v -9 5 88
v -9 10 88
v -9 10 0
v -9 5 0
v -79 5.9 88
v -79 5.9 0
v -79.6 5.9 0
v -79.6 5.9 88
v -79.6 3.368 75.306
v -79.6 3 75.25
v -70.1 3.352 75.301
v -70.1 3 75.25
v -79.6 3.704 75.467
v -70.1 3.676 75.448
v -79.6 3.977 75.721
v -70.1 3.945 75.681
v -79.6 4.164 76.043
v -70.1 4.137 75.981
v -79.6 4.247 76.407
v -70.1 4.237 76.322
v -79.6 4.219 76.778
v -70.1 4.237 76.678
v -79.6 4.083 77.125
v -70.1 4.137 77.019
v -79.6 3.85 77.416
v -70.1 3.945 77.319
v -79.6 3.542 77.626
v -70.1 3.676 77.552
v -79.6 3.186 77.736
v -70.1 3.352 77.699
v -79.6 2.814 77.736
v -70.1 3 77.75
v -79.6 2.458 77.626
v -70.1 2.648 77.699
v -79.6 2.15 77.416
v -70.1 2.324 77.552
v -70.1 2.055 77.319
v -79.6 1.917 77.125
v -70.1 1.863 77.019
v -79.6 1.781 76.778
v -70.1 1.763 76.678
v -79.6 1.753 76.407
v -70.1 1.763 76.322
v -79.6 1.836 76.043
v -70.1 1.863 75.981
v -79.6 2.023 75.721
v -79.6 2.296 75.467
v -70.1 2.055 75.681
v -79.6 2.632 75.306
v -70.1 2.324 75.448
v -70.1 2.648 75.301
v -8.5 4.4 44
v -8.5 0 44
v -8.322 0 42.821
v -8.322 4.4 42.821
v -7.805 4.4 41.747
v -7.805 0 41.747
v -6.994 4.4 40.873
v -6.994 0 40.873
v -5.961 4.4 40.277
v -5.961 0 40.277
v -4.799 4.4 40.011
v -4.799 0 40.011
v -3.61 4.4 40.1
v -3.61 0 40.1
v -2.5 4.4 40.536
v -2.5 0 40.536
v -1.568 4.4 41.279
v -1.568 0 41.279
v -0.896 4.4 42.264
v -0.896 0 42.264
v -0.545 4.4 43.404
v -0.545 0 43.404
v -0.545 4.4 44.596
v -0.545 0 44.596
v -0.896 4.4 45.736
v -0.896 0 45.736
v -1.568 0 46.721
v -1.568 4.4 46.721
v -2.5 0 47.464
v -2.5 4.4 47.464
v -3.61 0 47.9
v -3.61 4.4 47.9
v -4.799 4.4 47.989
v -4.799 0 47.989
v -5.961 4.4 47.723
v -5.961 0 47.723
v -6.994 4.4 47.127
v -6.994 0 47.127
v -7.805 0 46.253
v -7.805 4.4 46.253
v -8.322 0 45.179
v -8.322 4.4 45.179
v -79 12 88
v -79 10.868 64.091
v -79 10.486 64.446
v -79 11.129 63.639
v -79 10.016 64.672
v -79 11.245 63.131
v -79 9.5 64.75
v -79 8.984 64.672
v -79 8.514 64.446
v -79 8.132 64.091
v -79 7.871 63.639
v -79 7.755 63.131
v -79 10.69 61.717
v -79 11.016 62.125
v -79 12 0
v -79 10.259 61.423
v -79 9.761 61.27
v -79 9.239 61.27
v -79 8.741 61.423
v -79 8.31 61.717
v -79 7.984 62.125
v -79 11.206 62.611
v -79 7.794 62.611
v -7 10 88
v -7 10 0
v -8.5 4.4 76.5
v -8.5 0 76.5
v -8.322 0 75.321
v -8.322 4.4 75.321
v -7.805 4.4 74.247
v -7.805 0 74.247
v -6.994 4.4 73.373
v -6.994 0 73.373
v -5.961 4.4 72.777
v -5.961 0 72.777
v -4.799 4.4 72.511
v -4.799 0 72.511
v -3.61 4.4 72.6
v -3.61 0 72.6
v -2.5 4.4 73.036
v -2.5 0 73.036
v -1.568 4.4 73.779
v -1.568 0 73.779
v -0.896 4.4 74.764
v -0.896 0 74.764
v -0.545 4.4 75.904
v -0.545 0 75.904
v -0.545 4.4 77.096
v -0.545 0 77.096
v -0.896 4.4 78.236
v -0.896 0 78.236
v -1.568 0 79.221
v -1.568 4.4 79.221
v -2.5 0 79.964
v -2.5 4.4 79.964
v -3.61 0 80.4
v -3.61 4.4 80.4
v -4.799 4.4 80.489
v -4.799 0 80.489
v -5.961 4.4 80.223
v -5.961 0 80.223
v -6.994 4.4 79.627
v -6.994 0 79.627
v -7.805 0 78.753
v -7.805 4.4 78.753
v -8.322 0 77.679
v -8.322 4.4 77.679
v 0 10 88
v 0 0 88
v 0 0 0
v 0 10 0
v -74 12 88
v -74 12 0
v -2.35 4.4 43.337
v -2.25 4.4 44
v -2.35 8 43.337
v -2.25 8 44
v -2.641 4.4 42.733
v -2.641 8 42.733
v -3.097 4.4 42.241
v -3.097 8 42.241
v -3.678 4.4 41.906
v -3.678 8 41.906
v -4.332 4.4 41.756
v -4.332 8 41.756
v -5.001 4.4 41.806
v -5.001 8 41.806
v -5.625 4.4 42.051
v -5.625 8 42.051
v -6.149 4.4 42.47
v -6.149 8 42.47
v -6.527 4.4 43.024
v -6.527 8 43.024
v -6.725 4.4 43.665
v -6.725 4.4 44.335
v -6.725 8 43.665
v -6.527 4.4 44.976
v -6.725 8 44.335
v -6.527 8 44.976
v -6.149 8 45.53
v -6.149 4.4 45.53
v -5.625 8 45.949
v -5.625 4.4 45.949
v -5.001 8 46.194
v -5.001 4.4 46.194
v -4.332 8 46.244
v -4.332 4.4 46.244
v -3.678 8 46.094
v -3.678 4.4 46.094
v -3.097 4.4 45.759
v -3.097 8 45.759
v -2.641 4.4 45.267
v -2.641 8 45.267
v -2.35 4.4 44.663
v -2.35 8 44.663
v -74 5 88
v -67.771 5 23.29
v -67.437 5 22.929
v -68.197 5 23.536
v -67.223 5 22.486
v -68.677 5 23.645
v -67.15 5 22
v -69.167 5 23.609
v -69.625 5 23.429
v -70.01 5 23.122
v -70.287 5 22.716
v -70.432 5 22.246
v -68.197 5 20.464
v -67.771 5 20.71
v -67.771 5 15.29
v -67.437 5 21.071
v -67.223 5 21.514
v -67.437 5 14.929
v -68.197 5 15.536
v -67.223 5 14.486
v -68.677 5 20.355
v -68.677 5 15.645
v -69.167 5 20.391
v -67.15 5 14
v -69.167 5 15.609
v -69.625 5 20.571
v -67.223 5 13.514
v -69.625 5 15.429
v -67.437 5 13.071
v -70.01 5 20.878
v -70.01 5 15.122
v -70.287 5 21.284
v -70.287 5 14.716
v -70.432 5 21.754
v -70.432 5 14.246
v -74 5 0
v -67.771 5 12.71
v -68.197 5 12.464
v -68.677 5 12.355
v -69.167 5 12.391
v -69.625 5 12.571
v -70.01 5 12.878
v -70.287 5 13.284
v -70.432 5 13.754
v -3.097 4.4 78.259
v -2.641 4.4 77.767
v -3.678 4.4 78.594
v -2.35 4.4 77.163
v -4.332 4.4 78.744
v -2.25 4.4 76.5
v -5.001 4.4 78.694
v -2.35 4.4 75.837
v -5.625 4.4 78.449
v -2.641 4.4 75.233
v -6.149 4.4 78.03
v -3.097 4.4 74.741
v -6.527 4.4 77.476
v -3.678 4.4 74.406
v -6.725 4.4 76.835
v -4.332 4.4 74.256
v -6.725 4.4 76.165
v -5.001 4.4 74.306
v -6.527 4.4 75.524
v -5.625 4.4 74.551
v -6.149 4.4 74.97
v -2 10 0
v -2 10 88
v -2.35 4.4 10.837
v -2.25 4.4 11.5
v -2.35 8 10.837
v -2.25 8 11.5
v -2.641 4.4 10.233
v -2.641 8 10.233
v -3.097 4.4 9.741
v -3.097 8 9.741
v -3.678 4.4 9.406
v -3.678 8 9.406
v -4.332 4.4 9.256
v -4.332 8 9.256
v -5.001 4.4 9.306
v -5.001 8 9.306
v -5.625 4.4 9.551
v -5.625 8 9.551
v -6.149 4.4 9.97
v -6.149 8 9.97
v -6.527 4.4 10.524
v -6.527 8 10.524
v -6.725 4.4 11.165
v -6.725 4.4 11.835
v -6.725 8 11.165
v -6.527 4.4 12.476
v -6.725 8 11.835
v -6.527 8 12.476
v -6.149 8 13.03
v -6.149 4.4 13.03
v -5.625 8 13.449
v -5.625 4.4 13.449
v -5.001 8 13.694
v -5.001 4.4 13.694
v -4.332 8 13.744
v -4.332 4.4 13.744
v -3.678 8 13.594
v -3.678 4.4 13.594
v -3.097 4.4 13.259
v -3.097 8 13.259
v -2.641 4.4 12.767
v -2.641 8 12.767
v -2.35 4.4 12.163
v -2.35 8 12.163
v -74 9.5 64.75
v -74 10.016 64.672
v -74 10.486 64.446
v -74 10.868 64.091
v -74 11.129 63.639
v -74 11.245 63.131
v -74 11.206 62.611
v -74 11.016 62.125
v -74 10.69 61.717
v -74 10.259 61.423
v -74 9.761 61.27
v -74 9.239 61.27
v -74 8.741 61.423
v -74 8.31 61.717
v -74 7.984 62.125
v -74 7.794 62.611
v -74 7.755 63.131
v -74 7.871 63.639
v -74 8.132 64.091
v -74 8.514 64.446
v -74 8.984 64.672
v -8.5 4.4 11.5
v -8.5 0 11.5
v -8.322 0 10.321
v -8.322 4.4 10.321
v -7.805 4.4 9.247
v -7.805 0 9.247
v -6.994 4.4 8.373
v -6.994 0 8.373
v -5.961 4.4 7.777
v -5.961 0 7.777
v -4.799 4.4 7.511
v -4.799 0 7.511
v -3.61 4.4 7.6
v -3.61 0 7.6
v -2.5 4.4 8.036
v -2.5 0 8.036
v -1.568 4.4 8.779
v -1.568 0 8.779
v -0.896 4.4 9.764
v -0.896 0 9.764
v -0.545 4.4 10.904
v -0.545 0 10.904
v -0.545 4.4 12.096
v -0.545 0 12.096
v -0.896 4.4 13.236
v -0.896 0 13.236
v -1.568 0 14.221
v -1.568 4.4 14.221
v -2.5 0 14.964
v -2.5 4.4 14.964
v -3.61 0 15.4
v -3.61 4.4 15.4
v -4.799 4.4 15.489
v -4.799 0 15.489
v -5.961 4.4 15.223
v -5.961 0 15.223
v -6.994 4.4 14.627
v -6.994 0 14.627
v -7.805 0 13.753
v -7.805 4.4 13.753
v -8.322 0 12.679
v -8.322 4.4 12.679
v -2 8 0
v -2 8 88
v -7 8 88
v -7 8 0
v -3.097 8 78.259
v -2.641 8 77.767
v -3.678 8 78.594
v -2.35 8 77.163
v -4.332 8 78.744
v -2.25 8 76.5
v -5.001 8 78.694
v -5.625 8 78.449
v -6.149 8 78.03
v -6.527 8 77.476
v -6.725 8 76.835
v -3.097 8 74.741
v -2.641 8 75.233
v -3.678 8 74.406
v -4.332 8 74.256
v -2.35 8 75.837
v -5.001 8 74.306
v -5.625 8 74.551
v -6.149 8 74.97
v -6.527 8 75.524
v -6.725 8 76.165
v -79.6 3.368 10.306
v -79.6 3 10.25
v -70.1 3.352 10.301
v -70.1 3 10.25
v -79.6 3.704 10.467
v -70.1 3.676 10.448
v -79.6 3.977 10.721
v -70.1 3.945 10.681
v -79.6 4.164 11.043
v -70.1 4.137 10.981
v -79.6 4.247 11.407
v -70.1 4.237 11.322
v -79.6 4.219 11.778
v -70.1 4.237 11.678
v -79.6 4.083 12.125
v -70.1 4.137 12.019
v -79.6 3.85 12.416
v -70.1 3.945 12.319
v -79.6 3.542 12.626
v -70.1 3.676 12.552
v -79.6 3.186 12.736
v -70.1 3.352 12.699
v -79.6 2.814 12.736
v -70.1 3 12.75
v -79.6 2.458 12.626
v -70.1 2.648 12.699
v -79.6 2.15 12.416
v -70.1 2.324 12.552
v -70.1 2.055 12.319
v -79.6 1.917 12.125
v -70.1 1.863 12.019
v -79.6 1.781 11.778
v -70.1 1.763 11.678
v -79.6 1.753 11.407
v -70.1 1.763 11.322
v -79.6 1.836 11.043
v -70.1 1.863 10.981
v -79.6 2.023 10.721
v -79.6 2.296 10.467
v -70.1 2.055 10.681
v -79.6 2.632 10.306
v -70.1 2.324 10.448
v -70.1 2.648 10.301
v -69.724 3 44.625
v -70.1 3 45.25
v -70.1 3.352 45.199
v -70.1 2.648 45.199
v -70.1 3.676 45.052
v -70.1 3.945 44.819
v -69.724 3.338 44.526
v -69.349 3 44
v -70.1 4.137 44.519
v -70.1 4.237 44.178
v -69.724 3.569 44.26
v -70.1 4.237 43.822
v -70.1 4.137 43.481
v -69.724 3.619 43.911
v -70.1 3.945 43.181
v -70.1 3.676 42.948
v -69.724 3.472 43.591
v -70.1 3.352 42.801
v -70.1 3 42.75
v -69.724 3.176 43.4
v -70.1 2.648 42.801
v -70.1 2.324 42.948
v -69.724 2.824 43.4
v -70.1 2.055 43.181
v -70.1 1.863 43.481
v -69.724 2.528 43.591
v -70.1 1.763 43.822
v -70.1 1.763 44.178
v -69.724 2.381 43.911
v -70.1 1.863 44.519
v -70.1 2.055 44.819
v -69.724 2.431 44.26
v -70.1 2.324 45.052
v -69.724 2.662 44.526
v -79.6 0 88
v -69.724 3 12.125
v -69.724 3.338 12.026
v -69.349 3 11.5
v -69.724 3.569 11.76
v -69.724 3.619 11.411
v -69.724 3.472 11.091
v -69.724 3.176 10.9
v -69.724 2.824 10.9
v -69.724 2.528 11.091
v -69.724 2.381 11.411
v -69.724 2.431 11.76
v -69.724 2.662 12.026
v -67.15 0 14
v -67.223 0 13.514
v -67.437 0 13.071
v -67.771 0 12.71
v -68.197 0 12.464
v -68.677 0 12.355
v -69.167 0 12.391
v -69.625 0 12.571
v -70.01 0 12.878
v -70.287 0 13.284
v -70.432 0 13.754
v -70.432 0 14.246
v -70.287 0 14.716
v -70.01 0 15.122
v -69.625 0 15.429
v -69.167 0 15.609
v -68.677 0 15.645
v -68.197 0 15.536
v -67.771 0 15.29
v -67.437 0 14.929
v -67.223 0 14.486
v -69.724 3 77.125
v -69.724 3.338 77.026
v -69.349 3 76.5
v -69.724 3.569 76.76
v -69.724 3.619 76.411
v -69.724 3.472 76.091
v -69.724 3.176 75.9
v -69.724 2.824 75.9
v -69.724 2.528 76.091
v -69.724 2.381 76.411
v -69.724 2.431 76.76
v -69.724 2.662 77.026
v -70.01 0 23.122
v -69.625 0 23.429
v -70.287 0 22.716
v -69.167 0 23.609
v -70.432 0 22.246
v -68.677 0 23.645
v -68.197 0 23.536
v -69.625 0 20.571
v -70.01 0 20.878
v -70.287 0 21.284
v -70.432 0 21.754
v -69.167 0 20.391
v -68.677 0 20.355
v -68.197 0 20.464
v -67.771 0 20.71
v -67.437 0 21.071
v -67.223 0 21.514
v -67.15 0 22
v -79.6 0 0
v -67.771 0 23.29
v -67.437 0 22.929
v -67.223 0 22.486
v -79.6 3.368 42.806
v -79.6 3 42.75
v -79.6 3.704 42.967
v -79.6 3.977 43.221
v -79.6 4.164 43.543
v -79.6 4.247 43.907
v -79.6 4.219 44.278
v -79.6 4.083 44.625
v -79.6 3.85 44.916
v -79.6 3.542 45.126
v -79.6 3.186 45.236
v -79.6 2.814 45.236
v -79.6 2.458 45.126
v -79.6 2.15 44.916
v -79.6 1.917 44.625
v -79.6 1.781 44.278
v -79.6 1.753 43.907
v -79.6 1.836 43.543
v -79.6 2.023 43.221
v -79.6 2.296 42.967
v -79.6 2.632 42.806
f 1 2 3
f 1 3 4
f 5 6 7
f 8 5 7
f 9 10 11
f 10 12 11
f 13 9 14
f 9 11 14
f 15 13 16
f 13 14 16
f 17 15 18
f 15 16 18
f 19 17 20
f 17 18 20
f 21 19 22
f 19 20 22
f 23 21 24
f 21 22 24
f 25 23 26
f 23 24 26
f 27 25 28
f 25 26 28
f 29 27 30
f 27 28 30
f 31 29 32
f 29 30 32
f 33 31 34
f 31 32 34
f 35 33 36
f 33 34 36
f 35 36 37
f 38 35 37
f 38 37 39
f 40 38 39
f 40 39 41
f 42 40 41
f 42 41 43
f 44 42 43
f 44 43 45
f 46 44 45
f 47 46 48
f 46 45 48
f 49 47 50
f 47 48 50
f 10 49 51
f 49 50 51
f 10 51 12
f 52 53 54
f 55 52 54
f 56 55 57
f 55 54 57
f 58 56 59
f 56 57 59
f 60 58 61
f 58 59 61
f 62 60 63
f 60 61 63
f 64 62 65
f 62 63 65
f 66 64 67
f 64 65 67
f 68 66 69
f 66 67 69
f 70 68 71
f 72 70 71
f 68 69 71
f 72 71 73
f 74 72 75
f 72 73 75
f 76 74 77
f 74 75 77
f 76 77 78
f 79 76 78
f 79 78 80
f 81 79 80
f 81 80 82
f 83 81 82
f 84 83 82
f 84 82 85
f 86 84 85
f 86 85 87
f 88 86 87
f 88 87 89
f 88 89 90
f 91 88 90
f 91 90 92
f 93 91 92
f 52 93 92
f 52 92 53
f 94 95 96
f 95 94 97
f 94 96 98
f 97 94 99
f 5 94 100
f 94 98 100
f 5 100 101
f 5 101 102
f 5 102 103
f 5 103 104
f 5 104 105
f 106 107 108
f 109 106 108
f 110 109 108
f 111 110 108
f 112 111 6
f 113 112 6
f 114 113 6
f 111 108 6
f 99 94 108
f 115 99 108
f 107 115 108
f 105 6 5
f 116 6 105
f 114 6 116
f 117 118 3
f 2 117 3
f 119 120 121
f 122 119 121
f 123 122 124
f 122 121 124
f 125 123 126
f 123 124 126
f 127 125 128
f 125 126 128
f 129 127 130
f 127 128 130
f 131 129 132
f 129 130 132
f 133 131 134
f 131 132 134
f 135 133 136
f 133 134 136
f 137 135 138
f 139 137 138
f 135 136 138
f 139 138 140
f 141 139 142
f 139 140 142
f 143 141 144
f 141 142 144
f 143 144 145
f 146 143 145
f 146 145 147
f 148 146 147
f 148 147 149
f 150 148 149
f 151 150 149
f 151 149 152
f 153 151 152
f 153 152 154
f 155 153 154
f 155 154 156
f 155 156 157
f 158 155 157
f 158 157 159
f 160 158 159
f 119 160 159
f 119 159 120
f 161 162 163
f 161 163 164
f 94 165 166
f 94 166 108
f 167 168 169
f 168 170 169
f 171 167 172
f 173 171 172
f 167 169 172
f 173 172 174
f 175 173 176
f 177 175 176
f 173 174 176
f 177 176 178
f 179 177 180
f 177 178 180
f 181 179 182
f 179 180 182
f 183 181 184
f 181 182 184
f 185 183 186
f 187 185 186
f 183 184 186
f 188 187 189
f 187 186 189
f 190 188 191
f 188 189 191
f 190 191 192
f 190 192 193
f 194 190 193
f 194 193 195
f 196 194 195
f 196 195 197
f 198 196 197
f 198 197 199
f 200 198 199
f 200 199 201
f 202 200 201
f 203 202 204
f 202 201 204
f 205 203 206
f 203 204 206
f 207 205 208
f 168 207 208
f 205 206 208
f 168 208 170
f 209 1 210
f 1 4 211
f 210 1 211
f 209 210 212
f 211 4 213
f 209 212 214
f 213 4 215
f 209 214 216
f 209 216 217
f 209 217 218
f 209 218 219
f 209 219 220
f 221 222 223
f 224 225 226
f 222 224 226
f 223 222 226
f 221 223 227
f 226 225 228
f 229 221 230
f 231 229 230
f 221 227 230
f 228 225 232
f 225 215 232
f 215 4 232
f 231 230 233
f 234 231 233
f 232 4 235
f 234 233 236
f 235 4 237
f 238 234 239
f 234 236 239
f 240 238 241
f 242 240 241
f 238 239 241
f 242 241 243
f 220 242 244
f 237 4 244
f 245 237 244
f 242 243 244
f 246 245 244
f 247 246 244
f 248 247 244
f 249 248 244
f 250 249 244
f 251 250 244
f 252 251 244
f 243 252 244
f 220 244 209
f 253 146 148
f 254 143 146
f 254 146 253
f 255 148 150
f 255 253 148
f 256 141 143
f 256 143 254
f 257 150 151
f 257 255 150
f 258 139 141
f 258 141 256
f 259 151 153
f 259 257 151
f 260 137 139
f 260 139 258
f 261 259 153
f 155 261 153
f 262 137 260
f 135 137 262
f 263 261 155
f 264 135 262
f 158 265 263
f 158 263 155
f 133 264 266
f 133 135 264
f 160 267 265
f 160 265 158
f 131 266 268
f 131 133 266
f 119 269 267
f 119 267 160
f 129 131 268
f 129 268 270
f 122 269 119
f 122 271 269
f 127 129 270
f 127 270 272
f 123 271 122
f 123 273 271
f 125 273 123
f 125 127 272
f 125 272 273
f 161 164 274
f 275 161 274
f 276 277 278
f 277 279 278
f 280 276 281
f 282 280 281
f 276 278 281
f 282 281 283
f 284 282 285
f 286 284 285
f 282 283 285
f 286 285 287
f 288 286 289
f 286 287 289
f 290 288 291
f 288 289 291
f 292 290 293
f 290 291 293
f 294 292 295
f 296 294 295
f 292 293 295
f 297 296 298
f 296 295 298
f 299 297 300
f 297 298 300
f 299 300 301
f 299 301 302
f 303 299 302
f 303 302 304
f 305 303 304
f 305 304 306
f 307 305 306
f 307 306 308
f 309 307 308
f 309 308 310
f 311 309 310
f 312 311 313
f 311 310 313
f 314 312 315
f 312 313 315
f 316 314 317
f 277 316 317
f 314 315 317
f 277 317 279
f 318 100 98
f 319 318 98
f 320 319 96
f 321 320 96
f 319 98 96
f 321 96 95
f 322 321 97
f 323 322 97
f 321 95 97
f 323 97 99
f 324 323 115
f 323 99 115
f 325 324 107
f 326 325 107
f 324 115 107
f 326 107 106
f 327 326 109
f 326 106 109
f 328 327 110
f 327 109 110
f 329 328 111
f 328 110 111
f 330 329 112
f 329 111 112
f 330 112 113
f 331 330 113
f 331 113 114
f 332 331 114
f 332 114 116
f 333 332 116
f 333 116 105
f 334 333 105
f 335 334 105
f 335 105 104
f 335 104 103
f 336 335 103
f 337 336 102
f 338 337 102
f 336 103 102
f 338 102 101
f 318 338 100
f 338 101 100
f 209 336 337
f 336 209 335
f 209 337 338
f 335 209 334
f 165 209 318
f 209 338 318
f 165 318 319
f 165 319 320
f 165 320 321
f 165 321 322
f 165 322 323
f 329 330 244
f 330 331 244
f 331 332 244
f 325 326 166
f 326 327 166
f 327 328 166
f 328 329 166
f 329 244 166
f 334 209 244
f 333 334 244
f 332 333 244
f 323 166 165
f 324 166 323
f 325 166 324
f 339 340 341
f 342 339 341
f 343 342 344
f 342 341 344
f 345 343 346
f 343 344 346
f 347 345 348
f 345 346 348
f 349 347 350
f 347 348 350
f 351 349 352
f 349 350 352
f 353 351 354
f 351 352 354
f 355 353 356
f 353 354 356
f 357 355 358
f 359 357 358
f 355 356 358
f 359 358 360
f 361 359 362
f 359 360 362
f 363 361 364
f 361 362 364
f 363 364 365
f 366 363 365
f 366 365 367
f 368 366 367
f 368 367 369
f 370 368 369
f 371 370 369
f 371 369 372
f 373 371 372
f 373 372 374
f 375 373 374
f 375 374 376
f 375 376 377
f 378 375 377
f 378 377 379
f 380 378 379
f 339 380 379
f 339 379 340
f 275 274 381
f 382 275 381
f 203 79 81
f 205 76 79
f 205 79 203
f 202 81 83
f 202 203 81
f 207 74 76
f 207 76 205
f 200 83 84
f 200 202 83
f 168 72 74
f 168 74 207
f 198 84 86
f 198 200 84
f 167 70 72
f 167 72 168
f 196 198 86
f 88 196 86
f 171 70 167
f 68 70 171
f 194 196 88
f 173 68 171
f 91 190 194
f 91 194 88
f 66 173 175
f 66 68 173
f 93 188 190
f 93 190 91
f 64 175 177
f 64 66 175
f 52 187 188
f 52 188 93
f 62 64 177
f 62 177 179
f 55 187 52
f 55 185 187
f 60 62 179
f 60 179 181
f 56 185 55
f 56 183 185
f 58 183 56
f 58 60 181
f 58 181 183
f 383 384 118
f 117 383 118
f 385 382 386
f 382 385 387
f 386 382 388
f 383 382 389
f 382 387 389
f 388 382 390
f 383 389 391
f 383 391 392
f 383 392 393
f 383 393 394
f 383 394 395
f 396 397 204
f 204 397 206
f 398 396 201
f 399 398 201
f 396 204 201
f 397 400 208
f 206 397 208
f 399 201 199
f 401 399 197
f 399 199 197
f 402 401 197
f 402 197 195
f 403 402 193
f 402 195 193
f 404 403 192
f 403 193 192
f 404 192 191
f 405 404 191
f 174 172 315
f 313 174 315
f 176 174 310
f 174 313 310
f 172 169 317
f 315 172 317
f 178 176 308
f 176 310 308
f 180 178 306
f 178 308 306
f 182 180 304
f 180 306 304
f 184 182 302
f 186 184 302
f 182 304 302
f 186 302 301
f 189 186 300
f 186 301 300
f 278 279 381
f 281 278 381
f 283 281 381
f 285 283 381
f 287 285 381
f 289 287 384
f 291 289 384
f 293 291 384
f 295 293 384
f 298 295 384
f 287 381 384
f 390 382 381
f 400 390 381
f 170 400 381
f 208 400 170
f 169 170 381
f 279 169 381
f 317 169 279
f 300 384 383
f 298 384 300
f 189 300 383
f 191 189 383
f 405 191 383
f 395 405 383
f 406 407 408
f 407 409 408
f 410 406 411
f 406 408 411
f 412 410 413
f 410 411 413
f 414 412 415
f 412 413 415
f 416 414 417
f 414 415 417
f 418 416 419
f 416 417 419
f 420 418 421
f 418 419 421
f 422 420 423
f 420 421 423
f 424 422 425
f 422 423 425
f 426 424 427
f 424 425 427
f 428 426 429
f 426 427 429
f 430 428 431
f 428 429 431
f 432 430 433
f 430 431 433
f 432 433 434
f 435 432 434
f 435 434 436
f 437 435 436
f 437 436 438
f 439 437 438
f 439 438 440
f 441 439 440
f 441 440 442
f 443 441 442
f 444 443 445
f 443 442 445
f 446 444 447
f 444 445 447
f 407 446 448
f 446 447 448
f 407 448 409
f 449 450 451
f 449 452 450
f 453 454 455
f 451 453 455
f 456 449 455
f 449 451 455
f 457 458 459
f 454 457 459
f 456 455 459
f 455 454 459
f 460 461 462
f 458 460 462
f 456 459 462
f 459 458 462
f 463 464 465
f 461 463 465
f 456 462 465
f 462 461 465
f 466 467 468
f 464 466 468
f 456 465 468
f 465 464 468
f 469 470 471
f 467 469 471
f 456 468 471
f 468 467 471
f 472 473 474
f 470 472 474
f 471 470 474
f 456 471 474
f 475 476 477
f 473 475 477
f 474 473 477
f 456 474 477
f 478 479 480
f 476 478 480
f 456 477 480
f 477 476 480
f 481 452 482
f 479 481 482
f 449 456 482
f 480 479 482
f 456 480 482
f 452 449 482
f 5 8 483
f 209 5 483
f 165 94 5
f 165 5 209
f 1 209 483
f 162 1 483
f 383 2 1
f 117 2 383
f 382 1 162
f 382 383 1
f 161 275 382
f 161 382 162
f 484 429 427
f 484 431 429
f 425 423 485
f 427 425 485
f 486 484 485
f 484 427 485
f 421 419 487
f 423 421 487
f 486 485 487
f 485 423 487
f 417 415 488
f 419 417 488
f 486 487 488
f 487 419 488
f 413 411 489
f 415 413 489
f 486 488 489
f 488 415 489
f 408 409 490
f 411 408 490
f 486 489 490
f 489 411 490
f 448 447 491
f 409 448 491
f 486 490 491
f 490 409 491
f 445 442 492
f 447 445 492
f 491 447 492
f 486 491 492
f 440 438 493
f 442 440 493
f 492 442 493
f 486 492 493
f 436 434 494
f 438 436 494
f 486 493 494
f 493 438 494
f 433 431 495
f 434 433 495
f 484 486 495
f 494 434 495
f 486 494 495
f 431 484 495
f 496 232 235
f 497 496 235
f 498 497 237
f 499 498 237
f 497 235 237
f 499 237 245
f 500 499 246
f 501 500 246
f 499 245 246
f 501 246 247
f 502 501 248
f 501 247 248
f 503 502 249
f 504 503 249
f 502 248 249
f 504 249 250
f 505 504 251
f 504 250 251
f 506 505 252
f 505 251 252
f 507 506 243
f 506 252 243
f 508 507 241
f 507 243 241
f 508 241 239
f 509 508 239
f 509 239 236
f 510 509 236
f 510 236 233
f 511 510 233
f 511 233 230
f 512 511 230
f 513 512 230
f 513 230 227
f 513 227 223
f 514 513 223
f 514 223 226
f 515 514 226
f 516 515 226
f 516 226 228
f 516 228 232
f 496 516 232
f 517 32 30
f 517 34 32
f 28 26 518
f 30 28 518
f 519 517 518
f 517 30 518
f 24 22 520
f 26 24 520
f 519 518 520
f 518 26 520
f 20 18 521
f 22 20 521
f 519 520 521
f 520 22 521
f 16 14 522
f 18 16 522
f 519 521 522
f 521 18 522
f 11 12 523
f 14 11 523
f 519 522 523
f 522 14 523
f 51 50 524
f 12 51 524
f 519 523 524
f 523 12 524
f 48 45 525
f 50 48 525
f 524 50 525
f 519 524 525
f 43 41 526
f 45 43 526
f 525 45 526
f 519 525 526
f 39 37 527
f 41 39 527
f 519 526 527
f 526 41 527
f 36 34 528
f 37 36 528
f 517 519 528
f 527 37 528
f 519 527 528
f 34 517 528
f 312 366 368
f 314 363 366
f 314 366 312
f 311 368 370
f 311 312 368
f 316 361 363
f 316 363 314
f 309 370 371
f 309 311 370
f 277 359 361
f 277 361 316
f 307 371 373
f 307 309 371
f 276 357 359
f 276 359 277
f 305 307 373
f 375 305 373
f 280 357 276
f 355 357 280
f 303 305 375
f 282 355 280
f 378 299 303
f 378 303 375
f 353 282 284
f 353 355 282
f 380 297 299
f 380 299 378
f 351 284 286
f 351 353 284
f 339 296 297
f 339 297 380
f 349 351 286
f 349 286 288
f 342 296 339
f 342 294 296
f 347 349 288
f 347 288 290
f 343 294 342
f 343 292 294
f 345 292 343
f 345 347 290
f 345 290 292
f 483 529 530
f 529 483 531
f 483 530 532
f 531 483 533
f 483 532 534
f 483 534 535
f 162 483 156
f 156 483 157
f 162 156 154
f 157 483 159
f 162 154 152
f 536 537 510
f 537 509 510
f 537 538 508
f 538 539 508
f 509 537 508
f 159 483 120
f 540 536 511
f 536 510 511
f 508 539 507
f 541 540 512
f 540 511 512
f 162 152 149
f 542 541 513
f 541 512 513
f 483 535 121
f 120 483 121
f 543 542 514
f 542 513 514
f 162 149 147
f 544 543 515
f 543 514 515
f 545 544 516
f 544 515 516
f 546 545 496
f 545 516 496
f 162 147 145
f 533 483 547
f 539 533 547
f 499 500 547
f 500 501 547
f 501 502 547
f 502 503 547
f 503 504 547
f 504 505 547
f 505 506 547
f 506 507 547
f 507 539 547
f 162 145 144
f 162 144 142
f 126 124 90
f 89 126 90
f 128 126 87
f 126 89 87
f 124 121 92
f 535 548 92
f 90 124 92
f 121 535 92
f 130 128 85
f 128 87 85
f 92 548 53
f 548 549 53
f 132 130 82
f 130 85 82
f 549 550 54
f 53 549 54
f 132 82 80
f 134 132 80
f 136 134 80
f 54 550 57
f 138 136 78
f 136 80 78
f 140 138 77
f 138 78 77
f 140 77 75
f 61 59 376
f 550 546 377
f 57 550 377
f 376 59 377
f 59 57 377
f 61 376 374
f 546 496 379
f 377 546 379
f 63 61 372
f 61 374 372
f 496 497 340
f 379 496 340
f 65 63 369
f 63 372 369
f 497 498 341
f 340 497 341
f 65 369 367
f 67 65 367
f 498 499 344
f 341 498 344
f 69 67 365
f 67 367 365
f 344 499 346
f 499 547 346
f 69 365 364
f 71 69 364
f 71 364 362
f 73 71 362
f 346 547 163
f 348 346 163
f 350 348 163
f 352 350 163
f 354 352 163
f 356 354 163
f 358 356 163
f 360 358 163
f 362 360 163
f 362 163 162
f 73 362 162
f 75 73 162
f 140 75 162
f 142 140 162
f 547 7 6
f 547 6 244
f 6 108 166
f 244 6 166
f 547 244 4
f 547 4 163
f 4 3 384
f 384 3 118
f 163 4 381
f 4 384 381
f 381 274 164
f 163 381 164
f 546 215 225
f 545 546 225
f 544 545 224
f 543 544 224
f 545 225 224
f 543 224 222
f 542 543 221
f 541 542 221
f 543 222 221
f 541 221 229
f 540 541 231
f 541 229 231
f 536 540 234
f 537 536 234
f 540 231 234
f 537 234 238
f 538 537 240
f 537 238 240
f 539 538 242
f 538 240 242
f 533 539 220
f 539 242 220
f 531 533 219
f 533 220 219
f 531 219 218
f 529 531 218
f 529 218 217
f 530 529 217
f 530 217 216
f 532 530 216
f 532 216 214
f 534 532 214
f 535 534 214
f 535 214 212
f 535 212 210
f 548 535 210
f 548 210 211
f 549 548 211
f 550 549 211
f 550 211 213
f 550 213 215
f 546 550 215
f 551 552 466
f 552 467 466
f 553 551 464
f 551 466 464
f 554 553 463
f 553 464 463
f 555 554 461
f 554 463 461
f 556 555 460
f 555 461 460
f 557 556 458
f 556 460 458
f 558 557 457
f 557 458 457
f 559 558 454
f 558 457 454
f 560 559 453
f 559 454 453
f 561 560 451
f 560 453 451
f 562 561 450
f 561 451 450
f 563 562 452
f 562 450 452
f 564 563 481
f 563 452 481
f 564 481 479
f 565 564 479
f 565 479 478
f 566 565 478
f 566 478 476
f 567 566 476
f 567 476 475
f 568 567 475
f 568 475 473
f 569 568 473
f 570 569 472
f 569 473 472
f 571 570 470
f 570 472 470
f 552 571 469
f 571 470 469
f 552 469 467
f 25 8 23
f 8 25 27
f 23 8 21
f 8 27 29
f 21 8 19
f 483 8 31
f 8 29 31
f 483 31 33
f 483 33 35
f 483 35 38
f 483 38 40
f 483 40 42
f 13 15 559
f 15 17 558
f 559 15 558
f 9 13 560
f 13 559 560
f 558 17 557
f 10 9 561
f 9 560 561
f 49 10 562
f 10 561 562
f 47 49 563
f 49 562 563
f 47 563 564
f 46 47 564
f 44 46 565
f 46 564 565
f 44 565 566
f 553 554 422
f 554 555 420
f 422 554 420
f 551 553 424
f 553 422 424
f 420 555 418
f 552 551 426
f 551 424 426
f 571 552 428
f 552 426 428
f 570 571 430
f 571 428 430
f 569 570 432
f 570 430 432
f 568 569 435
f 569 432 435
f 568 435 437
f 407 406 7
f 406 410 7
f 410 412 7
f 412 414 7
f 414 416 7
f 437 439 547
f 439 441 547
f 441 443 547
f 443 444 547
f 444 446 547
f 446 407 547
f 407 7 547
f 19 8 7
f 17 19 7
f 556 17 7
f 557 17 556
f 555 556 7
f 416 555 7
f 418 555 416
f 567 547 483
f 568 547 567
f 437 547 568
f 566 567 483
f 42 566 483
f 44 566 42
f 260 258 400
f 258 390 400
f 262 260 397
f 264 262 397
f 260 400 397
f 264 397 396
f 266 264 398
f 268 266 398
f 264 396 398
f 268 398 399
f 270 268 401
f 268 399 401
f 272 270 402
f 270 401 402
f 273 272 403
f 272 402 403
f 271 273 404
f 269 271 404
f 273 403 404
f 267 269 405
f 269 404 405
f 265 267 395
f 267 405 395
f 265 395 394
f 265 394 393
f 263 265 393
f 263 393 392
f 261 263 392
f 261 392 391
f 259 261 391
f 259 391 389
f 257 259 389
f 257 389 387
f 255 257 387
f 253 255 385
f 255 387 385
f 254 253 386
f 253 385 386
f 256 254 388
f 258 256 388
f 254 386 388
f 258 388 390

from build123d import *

# Parameters (mm, degrees)
EXTRUDE_1_DEPTH              = 88
HOLE_WIZARD_M4_1_D           = 4.5
HOLE_WIZARD_M4_1_CBORE_D     = 8
HOLE_WIZARD_M4_1_CBORE_DEPTH = 4.4
HOLE_WIZARD_M4_1_2_D         = 3.3
HOLE_WIZARD_M3_1_D           = 2.5
HOLE_WIZARD_M3_1_DEPTH       = 9.5
HOLE_WIZARD_M3_1_TIP         = 0.751075774
SKETCH_8_R                   = 1.75
CUT_EXTRUDE_1_DEPTH          = 5


with BuildPart() as part:
    # 草图1 → 凸台-拉伸1 (new body)
    with BuildSketch(Plane.XY):
        Polygon((-9, 10), (-9, 5), (-74, 5), (-74, 12), (-79, 12), (-79, 5.9), (-79.6, 5.9), (-79.6, 0), (0, 0), (0, 10), (-2, 10), (-2, 8), (-7, 8), (-7, 10), align=None)
    extrude(amount=EXTRUDE_1_DEPTH)

    # Hole Wizard M4 _1 (through all)
    with Locations(Plane(origin=(0, 0, 0), x_dir=(-1, 0, 0), z_dir=(0, -1, 0))):
        with Locations((4.5, -11.5), (4.5, -44), (4.5, -76.5)):
            CounterBoreHole(HOLE_WIZARD_M4_1_D / 2, HOLE_WIZARD_M4_1_CBORE_D / 2, HOLE_WIZARD_M4_1_CBORE_DEPTH)

    # Hole Wizard M4 _1 2 (through all)
    with Locations(Plane(origin=(0, 0, 0), x_dir=(-1, 0, 0), z_dir=(0, -1, 0))):
        with Locations((68.8, -14), (68.8, -22)):
            Hole(HOLE_WIZARD_M4_1_2_D / 2)

    # M3 螺纹孔1
    with Locations(Plane.ZY.offset(79.6)):
        with Locations((11.5, 3), (44, 3), (76.5, 3)):
            Hole(HOLE_WIZARD_M3_1_D / 2, depth=HOLE_WIZARD_M3_1_DEPTH)
            with Locations((0, 0, -(HOLE_WIZARD_M3_1_DEPTH + HOLE_WIZARD_M3_1_TIP / 2))):  # 118° drill point
                Cone(0, HOLE_WIZARD_M3_1_D / 2, HOLE_WIZARD_M3_1_TIP, mode=Mode.SUBTRACT)

    # 草图8 → 切除-拉伸1 (cut)
    with BuildSketch(Plane.ZY.offset(79)):
        with Locations((63, 9.5)):
            Circle(SKETCH_8_R)
    extrude(amount=-CUT_EXTRUDE_1_DEPTH, mode=Mode.SUBTRACT)


solid = part.part
